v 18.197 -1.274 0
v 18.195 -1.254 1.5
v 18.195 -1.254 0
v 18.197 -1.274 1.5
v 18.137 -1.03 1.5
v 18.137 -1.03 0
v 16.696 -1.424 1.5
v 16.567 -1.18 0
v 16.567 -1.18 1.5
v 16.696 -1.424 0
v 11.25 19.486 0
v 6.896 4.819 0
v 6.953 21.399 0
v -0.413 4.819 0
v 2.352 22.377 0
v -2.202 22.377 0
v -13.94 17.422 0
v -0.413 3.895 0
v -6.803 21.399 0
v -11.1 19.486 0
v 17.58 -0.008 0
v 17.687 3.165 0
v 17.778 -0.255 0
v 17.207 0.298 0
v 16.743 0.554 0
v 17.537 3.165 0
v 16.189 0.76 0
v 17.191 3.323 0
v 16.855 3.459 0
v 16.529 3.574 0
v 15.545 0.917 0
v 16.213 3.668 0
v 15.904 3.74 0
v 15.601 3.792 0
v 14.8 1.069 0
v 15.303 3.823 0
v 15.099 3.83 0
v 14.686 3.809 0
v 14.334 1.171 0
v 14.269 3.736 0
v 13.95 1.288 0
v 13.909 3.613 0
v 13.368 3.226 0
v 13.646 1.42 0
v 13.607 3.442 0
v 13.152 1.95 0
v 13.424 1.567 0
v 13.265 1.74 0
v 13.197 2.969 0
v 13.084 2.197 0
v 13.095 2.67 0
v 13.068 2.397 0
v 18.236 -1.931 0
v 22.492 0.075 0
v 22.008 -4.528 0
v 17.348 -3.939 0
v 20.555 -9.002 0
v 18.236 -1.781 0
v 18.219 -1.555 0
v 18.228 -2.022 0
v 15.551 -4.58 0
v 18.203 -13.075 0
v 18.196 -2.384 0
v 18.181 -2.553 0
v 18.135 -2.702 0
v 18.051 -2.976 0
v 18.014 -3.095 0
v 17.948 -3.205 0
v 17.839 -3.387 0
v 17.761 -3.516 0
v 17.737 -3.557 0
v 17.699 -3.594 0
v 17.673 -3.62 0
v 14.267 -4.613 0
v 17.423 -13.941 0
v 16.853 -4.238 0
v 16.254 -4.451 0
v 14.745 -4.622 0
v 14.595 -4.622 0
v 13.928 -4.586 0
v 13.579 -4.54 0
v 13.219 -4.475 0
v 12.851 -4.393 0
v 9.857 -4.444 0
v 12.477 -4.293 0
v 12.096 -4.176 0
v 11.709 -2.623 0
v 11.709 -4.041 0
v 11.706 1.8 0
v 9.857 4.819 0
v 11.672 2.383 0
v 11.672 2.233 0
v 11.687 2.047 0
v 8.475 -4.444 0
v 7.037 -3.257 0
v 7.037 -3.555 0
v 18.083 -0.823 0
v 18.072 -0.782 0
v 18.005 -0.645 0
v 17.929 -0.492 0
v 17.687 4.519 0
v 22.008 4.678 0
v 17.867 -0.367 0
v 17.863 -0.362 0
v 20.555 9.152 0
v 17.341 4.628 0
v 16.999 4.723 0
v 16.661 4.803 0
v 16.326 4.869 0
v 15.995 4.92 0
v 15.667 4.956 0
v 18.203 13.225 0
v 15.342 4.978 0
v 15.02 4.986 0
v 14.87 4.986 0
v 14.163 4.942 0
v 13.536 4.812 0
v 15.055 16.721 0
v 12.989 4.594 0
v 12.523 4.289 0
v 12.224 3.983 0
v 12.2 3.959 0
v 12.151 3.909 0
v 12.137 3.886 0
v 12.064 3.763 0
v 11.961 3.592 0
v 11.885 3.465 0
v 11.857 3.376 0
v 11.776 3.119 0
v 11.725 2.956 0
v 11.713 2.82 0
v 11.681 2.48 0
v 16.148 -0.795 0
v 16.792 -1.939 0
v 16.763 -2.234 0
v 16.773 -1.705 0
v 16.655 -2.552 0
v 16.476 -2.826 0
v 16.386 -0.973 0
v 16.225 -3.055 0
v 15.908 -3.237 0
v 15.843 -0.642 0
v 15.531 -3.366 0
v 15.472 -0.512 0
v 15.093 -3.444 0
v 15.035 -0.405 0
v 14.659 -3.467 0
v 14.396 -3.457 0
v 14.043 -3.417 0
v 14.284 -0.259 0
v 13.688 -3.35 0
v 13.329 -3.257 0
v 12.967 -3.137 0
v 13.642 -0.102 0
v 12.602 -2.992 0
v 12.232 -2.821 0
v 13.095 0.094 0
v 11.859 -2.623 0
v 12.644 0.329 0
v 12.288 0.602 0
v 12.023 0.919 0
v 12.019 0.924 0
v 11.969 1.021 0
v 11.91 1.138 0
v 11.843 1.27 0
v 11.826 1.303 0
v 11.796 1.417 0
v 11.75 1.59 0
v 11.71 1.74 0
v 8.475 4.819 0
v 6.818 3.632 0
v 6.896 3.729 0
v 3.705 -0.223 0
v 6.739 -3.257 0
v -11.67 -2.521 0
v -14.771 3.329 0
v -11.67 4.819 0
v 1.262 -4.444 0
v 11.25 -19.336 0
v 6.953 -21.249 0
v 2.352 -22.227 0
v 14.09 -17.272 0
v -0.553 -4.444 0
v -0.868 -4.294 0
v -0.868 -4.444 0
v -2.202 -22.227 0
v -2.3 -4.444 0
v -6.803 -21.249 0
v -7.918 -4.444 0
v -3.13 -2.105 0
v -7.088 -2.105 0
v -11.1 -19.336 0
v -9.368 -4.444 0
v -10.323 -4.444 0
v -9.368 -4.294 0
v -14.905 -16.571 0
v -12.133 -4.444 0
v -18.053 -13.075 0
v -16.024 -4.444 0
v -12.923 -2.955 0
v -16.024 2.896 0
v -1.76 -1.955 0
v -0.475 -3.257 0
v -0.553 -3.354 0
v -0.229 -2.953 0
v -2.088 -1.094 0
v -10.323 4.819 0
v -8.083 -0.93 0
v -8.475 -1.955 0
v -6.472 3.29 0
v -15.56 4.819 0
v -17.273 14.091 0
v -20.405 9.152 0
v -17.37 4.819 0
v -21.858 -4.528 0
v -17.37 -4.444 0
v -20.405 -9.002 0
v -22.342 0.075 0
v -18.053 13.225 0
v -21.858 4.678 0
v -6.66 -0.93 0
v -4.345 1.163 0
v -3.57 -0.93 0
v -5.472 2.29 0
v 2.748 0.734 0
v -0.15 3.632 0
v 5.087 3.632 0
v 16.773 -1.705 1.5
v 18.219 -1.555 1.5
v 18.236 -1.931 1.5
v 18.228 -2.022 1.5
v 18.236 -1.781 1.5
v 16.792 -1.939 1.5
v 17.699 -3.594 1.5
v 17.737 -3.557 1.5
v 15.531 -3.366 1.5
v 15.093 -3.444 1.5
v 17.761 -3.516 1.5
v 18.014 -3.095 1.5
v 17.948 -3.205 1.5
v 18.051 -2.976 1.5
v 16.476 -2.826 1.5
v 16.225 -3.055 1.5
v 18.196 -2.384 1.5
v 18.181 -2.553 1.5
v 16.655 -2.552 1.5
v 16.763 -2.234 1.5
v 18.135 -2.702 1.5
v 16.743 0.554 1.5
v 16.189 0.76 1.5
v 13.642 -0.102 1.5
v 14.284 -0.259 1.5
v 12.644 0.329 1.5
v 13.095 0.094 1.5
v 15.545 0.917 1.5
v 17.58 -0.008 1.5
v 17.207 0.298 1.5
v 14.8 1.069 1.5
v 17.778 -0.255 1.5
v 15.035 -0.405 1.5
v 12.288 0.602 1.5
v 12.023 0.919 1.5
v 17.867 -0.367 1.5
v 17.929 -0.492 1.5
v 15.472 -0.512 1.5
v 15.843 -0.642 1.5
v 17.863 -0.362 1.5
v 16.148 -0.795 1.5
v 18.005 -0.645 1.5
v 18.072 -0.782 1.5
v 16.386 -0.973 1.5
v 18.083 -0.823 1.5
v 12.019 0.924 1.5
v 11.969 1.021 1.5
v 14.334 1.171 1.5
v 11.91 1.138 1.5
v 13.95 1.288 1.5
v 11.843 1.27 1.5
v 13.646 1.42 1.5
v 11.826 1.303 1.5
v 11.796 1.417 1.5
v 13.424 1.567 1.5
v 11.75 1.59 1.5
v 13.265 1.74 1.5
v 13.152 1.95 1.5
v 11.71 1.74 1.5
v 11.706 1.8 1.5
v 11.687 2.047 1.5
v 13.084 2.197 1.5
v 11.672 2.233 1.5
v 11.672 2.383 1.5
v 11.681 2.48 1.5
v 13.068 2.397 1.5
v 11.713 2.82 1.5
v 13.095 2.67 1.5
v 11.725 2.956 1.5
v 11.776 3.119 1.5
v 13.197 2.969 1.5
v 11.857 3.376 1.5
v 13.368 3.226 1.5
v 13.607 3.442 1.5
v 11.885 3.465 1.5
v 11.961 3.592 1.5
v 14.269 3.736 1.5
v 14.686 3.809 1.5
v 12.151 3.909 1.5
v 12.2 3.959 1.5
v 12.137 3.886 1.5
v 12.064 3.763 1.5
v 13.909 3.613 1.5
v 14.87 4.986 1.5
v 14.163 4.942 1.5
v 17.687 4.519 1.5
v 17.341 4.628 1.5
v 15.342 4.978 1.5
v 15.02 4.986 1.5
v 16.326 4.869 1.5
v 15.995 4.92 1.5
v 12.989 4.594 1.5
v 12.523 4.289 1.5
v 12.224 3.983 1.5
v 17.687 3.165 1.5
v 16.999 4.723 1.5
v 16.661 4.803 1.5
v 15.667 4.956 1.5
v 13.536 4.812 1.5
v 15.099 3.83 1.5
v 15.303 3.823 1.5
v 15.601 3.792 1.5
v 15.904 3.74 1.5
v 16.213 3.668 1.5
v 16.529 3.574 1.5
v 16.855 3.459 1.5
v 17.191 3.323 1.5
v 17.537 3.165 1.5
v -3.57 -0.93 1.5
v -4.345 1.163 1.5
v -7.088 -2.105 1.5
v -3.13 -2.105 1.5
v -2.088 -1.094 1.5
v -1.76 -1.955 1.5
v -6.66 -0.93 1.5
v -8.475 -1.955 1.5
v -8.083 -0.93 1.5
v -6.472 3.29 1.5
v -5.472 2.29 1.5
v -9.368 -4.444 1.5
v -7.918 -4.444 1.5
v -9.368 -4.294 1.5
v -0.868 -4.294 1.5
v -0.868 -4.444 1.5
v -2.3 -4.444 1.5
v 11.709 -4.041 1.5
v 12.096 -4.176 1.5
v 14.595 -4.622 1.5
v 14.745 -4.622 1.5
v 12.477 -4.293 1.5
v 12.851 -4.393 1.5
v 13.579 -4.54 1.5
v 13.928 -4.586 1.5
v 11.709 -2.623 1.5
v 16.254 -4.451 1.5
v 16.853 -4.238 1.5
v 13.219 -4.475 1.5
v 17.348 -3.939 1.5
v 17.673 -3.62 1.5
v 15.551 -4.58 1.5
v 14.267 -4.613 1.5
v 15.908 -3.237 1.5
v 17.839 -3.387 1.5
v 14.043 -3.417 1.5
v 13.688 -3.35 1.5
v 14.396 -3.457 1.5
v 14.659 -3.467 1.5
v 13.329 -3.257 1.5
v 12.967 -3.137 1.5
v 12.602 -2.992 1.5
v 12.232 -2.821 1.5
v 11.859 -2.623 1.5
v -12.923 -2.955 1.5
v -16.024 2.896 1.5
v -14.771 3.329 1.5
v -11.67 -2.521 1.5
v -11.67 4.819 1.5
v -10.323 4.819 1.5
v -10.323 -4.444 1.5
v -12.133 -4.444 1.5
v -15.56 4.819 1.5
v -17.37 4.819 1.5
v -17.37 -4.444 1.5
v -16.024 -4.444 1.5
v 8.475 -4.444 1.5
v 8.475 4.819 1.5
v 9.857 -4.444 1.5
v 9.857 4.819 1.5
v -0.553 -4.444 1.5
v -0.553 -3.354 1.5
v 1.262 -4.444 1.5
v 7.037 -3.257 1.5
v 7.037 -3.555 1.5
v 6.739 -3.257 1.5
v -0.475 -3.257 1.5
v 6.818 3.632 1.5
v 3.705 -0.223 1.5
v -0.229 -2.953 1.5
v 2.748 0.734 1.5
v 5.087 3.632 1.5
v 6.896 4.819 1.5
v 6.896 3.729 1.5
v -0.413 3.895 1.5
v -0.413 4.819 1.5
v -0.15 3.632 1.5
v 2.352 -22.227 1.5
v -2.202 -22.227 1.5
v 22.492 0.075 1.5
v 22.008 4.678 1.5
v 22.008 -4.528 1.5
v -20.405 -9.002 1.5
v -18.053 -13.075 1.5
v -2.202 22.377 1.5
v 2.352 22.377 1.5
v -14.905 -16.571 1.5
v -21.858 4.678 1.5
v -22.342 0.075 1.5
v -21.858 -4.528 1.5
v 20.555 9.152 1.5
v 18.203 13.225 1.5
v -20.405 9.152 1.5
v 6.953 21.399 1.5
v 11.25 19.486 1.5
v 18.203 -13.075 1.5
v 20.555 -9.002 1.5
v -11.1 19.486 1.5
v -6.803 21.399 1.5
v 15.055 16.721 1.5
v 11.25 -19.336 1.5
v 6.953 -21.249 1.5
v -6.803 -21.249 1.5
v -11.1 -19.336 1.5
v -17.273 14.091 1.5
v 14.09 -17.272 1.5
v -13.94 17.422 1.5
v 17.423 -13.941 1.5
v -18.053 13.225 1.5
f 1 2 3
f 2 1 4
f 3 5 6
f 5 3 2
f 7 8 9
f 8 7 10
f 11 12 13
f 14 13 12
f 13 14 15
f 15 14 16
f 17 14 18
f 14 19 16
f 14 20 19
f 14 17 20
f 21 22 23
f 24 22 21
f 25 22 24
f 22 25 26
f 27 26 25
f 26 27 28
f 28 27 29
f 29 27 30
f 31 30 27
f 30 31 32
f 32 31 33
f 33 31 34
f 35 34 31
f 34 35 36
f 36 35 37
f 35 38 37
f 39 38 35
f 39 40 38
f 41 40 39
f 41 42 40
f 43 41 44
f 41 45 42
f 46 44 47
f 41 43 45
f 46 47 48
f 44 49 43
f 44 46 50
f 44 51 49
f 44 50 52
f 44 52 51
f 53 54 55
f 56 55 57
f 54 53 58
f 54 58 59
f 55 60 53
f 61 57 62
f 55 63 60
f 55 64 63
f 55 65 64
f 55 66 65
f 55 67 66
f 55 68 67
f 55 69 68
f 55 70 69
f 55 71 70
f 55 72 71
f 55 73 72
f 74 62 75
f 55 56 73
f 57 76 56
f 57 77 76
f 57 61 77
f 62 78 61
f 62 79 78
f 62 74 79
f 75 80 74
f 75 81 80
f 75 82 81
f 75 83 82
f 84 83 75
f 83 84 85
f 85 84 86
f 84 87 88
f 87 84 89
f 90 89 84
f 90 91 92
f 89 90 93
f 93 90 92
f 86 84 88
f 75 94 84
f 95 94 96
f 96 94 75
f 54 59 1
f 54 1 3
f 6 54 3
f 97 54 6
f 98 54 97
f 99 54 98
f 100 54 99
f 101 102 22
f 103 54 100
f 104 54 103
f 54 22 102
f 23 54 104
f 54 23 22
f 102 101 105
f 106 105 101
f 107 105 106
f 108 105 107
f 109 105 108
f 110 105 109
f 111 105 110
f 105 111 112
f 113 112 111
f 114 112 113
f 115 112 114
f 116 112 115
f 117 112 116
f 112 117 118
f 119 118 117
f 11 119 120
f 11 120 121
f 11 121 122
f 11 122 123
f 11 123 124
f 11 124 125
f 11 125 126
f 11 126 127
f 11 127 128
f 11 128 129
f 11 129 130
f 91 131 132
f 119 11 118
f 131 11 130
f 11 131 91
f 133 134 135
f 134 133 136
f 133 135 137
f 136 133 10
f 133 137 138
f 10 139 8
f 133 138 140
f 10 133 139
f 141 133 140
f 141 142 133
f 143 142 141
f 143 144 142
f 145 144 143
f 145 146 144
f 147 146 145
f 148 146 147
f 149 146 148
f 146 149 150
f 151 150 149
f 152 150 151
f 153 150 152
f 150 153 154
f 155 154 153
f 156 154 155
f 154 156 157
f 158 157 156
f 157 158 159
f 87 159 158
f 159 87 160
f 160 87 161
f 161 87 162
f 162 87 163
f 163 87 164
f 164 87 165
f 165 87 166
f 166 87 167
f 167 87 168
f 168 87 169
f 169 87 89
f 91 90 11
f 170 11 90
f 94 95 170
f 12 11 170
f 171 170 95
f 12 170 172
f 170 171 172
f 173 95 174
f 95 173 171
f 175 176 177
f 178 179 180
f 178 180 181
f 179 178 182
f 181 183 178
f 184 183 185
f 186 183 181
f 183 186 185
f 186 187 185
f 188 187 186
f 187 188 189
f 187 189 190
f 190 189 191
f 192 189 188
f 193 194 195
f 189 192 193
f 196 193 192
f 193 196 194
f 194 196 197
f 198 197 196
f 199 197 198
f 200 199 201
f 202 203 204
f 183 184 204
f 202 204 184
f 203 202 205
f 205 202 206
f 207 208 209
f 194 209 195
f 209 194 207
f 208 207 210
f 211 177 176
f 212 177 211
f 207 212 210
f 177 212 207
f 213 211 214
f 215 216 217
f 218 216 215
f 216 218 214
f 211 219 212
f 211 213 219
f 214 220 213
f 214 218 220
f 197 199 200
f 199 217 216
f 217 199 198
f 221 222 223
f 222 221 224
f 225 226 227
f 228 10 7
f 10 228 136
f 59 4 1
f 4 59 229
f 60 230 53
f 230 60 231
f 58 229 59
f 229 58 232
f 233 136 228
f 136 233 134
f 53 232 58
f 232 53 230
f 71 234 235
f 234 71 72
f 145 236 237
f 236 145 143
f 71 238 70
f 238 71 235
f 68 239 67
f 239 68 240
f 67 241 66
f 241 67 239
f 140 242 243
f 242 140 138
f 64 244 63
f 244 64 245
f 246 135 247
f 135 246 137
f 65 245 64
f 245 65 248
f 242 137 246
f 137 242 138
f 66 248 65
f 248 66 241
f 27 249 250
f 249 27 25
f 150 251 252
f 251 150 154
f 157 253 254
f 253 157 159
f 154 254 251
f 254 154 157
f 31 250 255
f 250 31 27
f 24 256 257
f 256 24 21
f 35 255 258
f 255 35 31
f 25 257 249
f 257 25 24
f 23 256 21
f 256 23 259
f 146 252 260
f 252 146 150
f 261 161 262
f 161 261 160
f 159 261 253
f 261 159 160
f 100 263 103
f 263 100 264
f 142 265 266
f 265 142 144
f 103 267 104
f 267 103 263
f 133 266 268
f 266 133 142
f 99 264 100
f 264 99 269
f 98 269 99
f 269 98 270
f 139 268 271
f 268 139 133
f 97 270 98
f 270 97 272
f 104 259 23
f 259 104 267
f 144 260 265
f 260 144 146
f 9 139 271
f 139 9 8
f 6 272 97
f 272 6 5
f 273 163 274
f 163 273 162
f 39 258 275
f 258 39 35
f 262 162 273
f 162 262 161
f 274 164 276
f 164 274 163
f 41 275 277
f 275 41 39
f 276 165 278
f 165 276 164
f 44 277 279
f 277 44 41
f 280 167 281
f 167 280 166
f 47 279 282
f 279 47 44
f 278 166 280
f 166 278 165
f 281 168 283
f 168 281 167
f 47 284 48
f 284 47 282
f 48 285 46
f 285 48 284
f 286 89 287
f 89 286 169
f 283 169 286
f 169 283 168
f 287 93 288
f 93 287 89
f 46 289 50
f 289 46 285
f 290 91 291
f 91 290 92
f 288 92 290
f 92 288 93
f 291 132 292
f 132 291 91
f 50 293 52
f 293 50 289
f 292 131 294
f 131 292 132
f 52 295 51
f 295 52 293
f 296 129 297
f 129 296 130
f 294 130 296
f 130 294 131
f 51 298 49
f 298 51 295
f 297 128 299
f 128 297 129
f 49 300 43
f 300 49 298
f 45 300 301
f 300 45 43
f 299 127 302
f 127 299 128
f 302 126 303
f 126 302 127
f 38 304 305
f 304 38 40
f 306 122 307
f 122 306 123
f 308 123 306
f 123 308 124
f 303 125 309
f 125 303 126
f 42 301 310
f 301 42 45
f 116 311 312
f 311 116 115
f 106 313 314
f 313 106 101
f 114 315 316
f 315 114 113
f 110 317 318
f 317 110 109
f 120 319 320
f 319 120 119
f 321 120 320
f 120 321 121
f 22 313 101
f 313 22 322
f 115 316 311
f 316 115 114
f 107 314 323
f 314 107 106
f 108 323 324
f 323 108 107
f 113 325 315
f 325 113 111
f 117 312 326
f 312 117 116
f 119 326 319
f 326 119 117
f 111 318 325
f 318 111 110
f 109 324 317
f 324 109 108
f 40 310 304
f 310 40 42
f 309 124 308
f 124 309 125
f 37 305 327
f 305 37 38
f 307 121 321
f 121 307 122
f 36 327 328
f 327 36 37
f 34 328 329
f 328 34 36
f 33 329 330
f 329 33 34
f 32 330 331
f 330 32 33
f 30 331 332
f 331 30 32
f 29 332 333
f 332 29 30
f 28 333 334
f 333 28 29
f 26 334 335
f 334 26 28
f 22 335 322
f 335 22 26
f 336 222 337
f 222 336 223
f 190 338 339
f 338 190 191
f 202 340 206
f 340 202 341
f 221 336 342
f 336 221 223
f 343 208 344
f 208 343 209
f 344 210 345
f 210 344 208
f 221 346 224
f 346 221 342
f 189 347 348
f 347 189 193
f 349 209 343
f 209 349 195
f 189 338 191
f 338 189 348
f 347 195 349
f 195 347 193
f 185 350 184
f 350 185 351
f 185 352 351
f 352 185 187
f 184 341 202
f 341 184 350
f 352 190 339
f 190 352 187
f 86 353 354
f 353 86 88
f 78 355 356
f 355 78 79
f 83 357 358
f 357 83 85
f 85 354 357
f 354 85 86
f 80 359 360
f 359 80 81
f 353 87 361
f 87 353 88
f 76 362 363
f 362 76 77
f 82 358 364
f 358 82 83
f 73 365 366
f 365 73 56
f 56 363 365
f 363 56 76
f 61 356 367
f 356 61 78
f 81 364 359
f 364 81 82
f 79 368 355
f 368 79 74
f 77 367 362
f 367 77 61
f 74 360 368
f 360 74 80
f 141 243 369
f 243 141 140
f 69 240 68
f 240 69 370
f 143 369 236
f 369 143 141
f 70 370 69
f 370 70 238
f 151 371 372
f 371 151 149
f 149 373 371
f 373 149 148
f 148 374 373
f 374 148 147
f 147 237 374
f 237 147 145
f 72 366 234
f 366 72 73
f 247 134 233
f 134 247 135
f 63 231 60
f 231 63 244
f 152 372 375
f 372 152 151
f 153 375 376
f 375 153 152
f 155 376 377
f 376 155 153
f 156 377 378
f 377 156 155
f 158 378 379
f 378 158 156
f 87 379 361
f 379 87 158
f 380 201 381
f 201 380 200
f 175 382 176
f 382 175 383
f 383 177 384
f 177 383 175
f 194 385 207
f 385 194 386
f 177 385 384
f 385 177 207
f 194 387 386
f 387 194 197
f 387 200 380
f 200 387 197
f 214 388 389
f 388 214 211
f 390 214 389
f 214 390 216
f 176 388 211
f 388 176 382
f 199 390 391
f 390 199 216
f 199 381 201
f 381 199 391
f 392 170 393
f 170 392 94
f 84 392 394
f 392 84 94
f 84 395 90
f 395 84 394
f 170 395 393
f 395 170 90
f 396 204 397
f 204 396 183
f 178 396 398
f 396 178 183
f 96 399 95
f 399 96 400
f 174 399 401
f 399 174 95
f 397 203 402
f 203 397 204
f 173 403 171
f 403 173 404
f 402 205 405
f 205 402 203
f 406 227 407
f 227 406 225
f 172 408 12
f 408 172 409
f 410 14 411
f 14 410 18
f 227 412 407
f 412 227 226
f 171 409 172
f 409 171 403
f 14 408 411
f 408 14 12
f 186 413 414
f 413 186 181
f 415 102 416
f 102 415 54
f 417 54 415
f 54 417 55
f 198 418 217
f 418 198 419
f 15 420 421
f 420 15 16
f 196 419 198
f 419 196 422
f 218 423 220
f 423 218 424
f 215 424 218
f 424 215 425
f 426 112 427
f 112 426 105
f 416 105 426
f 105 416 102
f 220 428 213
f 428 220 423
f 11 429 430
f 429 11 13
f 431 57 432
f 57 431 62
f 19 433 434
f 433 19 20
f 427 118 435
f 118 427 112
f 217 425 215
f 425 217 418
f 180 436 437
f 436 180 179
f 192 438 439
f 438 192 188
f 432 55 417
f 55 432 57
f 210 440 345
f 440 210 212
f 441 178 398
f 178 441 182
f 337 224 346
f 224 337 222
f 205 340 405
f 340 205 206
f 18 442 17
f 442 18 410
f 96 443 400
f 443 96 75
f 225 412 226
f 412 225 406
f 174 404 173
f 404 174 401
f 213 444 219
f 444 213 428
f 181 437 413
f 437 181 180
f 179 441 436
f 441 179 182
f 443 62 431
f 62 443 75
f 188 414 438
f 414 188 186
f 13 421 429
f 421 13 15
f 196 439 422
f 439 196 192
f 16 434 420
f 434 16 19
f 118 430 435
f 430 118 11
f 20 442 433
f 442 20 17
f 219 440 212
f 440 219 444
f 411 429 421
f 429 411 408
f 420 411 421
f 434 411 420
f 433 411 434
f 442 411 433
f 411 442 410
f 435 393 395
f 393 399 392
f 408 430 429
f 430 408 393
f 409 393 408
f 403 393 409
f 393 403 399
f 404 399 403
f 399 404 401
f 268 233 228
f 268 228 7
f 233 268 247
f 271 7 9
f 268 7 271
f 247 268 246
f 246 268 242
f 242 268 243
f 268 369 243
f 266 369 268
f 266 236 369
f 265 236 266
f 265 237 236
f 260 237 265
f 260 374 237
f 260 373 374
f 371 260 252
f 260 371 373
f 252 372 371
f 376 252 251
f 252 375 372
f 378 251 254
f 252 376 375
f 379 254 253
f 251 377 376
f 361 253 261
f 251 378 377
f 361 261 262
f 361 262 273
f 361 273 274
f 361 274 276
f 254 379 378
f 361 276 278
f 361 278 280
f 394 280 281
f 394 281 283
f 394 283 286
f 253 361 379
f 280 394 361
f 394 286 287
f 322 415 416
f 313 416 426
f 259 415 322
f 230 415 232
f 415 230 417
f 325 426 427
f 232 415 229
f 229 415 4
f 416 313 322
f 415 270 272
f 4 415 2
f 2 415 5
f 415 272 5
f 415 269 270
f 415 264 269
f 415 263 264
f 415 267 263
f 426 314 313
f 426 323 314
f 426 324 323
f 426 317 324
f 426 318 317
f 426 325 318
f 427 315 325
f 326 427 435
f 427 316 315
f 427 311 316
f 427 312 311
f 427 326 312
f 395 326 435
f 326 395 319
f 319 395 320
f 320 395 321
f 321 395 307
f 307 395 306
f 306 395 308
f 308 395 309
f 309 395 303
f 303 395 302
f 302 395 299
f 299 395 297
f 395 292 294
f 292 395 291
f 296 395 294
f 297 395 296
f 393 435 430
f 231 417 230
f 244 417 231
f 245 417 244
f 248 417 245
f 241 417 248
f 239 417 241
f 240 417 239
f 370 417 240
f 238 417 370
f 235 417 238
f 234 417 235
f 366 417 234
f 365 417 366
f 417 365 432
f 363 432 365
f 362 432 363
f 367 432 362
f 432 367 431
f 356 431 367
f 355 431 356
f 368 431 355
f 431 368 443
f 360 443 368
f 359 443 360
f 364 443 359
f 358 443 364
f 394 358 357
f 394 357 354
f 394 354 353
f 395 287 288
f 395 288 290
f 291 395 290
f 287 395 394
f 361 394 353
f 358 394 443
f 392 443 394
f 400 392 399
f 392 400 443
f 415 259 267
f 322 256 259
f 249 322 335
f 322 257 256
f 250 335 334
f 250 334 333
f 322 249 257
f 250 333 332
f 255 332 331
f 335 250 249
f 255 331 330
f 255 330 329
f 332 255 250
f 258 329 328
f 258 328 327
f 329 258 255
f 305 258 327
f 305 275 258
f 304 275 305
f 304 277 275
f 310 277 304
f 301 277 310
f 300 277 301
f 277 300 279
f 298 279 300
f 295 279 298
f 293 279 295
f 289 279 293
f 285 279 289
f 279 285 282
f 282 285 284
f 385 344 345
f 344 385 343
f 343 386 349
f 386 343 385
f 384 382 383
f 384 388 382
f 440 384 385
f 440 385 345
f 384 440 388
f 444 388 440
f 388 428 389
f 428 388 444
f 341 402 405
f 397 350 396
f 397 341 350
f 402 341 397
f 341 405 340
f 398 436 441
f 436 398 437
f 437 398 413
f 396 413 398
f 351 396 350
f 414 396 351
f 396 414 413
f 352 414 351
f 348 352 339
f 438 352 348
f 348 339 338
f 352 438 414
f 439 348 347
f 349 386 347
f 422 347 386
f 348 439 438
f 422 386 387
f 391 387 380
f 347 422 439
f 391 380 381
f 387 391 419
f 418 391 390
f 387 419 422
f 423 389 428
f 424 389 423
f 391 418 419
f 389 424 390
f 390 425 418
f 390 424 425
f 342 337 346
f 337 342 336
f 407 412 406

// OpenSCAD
difference() {
	cylinder(h = 1.5, r = 22.5);
	minkowski() {
		linear_extrude(height = 2.25) {
			text(font = "Mic 32Bold", halign = "center", size = 9, text = "NAZIS", valign = "center");
		}
		cube(size = [0.15, 0.15, 0.15]);
	}
	minkowski() {
		union() {
			difference() {
				cylinder(h = 3.0, r = 27.0);
				cylinder(h = 3.0, r = 22.5);
			}
			rotate(a = [0, 0, -45]) {
				translate(v = [-24.75, 0, 0]) {
					translate(v = [0, -2.25, 0]) {
						cube(size = [49.5, 4.5, 3.0]);
					}
				}
			}
		}
		cube(size = [0.15, 0.15, 0.15]);
	}
}
